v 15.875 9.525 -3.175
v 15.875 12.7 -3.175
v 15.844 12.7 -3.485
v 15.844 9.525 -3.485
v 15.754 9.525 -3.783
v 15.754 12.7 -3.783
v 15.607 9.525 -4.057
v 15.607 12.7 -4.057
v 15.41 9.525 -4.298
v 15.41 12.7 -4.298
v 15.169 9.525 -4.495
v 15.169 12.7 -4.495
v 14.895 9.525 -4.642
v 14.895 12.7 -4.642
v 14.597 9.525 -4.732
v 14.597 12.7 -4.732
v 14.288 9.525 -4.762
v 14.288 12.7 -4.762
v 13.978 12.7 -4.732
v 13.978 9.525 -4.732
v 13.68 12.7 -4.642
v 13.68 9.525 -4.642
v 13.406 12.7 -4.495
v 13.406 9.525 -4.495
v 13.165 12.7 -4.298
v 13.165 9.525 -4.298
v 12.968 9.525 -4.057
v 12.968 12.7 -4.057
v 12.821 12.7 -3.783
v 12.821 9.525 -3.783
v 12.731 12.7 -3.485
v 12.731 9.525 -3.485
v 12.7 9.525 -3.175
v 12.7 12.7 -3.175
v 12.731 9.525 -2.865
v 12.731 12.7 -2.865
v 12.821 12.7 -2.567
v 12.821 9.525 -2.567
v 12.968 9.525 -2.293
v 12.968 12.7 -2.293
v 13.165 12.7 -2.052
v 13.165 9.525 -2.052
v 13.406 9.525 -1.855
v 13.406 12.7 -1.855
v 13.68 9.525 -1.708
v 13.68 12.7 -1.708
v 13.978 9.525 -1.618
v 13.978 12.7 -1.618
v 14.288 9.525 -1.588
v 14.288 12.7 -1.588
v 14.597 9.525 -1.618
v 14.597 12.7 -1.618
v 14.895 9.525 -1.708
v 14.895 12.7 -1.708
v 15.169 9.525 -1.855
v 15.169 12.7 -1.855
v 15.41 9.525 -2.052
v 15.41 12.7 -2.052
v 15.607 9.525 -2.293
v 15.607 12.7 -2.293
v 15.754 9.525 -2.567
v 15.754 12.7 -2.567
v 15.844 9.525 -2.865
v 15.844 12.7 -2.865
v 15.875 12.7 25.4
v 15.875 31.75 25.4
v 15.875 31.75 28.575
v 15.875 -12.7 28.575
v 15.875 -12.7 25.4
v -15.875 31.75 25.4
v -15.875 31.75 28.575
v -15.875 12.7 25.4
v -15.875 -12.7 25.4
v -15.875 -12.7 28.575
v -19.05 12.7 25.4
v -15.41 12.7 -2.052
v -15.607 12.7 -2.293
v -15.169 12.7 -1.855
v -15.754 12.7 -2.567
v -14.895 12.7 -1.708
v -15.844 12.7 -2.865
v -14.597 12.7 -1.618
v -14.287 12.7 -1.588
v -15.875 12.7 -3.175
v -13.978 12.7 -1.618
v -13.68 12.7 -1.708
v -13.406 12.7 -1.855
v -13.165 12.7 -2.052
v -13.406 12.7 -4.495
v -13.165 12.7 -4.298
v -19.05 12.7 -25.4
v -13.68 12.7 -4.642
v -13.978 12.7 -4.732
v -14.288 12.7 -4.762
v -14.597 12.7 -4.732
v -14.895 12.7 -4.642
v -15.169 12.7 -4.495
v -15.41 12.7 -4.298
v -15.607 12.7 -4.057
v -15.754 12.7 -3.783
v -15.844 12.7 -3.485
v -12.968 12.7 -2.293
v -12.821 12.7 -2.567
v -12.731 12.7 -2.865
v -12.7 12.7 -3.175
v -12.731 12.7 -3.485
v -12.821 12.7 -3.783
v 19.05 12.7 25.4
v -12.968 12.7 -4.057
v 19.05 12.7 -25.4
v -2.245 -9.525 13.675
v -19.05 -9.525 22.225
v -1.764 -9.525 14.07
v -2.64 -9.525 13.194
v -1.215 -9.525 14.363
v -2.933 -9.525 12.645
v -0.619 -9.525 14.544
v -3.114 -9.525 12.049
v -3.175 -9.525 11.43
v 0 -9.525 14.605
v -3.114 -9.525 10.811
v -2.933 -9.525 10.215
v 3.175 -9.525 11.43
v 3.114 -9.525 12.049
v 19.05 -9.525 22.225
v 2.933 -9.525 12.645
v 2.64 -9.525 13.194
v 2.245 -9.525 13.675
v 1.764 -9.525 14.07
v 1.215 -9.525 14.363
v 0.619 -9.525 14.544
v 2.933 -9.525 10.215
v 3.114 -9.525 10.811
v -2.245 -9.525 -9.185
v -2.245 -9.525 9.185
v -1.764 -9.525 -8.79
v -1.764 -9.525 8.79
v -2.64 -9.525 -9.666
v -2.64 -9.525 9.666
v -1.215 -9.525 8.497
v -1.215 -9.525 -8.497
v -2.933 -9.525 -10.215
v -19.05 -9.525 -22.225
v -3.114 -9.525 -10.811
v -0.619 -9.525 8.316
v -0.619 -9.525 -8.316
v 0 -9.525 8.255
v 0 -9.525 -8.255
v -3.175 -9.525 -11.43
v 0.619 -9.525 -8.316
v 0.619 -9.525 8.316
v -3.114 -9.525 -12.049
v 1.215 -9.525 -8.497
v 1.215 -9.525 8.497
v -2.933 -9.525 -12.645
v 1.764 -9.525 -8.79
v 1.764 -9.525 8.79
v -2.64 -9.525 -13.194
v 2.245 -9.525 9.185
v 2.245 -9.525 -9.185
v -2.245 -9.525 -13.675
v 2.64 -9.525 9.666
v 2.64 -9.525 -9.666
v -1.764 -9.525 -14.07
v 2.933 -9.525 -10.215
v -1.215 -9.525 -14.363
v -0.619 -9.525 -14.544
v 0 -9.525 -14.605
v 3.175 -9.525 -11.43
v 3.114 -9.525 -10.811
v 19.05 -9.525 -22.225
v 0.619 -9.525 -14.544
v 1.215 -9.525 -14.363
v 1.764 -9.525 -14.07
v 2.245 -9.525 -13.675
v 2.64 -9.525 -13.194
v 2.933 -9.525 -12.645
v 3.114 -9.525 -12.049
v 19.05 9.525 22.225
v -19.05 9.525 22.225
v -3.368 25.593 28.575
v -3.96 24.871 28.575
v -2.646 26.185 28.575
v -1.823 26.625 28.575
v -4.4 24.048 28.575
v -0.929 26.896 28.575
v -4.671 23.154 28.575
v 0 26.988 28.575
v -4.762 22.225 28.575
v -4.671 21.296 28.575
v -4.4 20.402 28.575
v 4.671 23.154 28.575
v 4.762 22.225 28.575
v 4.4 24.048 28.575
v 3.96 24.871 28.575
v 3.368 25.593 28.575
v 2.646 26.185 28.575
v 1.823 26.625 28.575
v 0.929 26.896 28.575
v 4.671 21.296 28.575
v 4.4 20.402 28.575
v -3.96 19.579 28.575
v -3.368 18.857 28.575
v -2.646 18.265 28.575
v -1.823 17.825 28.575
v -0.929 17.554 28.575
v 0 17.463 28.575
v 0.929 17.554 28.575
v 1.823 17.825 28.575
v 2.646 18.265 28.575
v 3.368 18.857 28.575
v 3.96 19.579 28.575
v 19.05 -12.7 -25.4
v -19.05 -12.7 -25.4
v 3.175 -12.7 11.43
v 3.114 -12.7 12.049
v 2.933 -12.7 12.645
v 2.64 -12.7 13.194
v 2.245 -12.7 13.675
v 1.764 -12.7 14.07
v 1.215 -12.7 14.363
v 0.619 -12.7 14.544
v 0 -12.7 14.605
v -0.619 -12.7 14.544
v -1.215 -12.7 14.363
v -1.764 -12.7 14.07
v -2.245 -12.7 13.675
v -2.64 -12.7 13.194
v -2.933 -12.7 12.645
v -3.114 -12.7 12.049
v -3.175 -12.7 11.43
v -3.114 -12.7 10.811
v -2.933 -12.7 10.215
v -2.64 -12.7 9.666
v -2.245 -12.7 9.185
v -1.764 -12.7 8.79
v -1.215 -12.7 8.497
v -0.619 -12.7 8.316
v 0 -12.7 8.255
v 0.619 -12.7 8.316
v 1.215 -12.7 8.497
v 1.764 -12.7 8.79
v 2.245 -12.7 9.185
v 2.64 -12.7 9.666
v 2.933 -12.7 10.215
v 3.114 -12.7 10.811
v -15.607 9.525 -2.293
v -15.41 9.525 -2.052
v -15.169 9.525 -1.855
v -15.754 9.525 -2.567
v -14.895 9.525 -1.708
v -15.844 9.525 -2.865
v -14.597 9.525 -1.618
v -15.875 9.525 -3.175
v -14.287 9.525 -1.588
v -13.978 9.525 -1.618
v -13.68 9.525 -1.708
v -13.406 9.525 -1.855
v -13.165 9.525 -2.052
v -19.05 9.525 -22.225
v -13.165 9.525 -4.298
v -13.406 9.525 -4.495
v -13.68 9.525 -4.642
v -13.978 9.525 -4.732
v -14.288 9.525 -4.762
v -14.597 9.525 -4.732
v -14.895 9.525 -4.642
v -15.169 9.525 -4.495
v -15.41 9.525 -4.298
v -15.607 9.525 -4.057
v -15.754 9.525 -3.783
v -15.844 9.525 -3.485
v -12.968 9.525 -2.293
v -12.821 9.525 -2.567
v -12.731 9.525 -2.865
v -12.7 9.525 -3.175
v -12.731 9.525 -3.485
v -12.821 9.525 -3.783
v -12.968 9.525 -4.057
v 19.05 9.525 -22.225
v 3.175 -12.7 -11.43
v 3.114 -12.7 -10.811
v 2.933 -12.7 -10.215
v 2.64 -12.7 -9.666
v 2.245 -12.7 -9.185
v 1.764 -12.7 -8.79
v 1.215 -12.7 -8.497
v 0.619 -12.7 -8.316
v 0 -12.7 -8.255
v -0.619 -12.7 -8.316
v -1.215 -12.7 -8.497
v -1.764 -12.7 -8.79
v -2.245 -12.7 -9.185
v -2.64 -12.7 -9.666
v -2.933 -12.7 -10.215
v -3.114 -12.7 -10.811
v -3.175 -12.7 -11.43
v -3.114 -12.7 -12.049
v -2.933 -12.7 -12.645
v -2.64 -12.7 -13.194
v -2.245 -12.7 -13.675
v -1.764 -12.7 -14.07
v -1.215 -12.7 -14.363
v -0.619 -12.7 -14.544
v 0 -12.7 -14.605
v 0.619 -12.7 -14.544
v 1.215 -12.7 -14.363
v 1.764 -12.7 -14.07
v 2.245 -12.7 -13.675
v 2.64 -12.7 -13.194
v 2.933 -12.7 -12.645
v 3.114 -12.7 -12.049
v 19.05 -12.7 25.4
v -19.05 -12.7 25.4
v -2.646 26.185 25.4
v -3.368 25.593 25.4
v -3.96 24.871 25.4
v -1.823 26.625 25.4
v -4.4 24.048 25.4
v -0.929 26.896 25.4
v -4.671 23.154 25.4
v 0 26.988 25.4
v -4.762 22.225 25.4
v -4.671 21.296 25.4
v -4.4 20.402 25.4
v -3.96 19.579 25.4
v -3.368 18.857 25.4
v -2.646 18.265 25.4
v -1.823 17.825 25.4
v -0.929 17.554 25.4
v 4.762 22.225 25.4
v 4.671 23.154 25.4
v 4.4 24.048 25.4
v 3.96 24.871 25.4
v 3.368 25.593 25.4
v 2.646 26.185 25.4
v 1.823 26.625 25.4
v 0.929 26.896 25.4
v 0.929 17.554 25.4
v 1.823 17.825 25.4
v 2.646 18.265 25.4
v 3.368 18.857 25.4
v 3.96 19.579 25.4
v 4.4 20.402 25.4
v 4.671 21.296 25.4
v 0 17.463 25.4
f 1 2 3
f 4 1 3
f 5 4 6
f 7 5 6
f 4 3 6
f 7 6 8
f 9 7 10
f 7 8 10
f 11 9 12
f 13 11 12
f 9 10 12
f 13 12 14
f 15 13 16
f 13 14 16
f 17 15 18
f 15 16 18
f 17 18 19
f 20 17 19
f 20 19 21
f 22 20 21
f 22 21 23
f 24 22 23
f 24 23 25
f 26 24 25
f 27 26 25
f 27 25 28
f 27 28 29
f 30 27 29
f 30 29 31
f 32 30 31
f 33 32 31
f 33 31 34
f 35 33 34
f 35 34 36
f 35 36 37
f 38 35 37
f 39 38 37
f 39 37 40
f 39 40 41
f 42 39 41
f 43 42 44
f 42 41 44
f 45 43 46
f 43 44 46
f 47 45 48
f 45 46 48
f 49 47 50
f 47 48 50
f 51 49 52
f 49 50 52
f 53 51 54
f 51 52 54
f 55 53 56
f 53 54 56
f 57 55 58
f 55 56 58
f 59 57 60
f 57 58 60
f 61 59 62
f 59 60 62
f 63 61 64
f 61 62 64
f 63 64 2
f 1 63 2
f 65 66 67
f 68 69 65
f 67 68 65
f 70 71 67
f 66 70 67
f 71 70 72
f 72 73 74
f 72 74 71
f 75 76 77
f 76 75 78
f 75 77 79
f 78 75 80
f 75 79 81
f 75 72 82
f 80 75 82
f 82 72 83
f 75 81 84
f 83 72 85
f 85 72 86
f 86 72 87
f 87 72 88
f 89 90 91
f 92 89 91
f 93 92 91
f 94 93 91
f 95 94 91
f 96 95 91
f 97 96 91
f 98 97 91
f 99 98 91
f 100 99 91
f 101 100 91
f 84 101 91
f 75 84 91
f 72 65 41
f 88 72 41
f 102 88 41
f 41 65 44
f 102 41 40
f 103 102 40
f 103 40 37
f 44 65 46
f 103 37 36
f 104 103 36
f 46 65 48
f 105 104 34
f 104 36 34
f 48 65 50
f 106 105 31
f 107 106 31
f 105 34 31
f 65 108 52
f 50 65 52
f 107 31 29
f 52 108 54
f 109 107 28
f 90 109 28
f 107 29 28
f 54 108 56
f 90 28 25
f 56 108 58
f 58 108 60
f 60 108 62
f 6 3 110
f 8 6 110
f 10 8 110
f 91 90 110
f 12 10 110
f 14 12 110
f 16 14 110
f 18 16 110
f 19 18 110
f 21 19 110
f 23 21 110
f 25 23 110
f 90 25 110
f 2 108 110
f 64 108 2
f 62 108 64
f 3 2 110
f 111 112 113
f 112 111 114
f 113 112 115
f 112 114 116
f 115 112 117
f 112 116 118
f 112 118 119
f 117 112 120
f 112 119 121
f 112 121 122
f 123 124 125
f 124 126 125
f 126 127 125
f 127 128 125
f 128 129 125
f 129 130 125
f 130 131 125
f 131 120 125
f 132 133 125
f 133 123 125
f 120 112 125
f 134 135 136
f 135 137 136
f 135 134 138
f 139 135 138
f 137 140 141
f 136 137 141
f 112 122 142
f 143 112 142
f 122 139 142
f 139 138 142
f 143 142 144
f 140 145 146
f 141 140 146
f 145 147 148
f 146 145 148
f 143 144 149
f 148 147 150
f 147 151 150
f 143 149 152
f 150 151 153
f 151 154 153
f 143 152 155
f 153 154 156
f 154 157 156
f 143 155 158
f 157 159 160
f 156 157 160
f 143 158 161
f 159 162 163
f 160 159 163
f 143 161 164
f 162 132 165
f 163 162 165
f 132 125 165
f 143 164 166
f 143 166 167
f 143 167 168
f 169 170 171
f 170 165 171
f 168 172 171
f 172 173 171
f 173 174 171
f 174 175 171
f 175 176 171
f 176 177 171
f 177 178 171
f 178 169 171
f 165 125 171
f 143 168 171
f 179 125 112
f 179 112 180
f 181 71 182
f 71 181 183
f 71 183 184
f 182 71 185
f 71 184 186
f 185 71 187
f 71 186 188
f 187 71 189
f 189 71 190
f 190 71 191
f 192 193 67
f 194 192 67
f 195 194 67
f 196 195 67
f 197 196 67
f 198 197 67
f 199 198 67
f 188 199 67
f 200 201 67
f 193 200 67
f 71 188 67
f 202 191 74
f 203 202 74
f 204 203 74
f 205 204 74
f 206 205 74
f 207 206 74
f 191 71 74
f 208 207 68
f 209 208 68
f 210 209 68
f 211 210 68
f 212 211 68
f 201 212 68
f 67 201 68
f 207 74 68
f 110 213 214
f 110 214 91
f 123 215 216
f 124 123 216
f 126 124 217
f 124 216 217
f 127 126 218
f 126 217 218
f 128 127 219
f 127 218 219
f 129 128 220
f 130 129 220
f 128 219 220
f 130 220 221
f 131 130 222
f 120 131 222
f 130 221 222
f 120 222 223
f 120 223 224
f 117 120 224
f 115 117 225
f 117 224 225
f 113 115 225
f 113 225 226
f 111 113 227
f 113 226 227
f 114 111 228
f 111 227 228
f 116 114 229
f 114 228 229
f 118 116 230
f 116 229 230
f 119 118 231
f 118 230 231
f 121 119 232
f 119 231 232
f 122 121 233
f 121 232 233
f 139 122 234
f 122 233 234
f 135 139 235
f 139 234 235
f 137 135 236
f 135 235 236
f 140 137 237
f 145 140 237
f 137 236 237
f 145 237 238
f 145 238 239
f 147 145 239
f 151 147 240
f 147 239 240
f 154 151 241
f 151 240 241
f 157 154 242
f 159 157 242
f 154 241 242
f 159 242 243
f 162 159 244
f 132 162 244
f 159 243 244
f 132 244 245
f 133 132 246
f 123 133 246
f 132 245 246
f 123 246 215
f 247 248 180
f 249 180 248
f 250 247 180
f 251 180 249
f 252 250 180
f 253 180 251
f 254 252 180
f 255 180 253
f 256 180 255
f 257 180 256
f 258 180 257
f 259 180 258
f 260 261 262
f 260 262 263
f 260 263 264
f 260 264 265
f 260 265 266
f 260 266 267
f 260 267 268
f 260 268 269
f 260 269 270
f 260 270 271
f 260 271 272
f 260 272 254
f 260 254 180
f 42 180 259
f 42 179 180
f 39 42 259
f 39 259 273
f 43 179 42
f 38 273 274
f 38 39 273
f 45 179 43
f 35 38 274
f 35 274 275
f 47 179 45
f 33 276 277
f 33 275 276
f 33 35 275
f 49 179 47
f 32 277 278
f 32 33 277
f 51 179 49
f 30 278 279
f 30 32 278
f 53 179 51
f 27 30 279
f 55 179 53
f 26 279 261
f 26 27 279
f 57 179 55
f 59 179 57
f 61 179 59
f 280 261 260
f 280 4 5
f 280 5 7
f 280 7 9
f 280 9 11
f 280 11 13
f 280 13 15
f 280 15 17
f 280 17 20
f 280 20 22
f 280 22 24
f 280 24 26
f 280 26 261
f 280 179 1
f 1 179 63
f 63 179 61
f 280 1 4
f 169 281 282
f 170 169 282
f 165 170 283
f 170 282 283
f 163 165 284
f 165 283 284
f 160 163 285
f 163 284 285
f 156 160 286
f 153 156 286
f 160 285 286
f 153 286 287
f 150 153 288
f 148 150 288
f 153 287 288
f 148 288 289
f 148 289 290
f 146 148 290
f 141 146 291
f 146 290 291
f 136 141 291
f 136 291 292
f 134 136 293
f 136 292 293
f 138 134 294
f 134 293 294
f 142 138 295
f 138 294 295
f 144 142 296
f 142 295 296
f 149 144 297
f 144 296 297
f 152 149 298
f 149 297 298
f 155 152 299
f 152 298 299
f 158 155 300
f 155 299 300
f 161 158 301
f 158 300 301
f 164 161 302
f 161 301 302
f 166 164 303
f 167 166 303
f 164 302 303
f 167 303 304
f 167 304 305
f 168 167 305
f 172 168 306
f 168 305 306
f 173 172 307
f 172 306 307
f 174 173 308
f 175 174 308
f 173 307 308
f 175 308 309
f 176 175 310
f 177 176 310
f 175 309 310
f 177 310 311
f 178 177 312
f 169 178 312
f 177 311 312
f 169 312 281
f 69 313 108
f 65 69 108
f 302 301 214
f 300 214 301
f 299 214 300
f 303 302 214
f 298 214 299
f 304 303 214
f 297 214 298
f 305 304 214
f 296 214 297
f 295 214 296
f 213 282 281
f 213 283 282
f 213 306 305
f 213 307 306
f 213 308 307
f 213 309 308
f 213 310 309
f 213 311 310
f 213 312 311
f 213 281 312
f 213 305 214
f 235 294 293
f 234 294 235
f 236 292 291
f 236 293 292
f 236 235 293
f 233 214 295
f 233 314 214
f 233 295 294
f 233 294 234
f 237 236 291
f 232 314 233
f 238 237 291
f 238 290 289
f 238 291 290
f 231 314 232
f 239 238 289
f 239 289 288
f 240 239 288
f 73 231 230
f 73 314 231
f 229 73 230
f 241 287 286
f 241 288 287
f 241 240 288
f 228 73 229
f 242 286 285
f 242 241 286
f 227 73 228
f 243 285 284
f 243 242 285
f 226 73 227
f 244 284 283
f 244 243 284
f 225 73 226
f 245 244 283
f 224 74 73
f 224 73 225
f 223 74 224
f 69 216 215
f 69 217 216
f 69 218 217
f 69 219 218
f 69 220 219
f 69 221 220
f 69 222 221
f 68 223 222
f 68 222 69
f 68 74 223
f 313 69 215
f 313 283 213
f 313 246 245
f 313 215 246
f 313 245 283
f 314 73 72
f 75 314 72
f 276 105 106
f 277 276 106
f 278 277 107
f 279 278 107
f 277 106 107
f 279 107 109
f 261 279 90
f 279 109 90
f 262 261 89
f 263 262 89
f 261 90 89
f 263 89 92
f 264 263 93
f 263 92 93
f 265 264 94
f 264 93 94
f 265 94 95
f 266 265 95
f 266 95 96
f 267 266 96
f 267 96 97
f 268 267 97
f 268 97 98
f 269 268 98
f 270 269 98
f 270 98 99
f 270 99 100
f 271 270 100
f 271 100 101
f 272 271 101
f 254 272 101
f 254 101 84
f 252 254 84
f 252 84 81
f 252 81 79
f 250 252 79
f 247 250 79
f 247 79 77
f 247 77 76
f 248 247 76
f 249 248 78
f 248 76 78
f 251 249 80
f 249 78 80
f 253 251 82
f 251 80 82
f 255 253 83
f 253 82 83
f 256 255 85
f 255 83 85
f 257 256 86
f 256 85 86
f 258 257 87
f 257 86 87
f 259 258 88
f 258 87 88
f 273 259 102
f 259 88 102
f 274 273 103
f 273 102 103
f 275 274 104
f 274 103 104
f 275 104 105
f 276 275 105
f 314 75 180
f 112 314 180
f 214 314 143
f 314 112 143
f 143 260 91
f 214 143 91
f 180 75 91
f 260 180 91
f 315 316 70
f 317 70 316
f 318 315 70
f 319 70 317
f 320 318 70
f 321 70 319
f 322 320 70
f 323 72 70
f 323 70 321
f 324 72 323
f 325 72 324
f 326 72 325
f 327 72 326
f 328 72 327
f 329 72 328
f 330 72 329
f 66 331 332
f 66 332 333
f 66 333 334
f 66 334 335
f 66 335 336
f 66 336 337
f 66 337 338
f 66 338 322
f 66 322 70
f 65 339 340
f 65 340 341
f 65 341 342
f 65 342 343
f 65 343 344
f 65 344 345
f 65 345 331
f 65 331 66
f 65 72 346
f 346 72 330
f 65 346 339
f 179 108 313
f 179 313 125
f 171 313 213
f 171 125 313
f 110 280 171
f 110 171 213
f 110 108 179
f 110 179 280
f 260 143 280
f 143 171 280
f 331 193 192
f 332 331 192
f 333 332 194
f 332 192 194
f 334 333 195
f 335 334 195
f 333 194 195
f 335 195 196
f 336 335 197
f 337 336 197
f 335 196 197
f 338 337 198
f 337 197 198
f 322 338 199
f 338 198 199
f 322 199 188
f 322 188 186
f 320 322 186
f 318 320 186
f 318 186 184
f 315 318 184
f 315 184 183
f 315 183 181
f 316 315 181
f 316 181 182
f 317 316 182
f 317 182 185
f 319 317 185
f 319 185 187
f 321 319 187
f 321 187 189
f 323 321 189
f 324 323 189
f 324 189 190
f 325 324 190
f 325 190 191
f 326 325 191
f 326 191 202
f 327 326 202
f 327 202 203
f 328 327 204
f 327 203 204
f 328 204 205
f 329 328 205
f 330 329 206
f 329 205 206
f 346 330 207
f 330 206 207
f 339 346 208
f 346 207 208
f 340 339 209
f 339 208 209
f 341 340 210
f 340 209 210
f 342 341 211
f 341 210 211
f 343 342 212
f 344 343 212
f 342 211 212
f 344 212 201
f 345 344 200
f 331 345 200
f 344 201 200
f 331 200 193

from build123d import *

# Parameters (mm, degrees)
SKETCH1_W           = 50.8
SKETCH1_H           = 25.4
SKETCH1_W_2         = 44.45
SKETCH1_H_2         = 19.05
EXTRUDE_THIN1_DEPTH = 19.05
SKETCH2_W           = 31.75
SKETCH2_H           = 3.175
BOSS_EXTRUDE1_DEPTH = 44.45
CUT_EXTRUDE1_REACH  = 55.975
SKETCH3_R           = 4.7625
CUT_EXTRUDE2_REACH  = 27.4
SKETCH4_R           = 1.5875
SKETCH8_R           = 3.175
CUT_EXTRUDE4_DEPTH  = 3.175


with BuildPart() as part:
    # Sketch1 → Extrude-Thin1 (new body, symmetric)
    with BuildSketch(Plane(origin=(0, 0, 0), x_dir=(0, 0, -1), z_dir=(1, 0, 0))):
        Rectangle(SKETCH1_W, SKETCH1_H)
        Rectangle(SKETCH1_W_2, SKETCH1_H_2, mode=Mode.SUBTRACT)
    extrude(amount=EXTRUDE_THIN1_DEPTH, both=True)

    # Sketch2 → Boss-Extrude1 (add)
    with BuildSketch(Plane.XZ.offset(12.7)):
        with Locations((0, 26.9875)):
            Rectangle(SKETCH2_W, SKETCH2_H)
    extrude(amount=-BOSS_EXTRUDE1_DEPTH)

    # Sketch3 → Cut-Extrude1 (cut, up to next)
    with BuildSketch(Plane.XY.offset(28.575), mode=Mode.PRIVATE) as cut_extrude1_sk1:
        with Locations((0, 22.225)):
            Circle(SKETCH3_R)
    cut_extrude1_tool1 = extrude(cut_extrude1_sk1.sketch, amount=-CUT_EXTRUDE1_REACH, mode=Mode.PRIVATE) & part.part
    add(cut_extrude1_tool1.solids().sort_by_distance((0, 22.225, 28.575))[0], mode=Mode.SUBTRACT)

    # Sketch4 → Cut-Extrude2 (cut, up to next)
    with BuildSketch(Plane(origin=(0, 12.7, 0), x_dir=(1, 0, 0), z_dir=(0, 1, 0)), mode=Mode.PRIVATE) as cut_extrude2_sk1:
        with Locations((14.2875, 3.175)):
            Circle(SKETCH4_R)
    cut_extrude2_tool1 = extrude(cut_extrude2_sk1.sketch, amount=-CUT_EXTRUDE2_REACH, mode=Mode.PRIVATE) & part.part
    add(cut_extrude2_tool1.solids().sort_by_distance((14.2875, 12.7, -3.175))[0], mode=Mode.SUBTRACT)
    # Sketch4 → Cut-Extrude2 (cut, up to next)
    with BuildSketch(Plane(origin=(0, 12.7, 0), x_dir=(1, 0, 0), z_dir=(0, 1, 0)), mode=Mode.PRIVATE) as cut_extrude2_sk2:
        with Locations((-14.2875, 3.175)):
            Circle(SKETCH4_R)
    cut_extrude2_tool2 = extrude(cut_extrude2_sk2.sketch, amount=-CUT_EXTRUDE2_REACH, mode=Mode.PRIVATE) & part.part
    add(cut_extrude2_tool2.solids().sort_by_distance((-14.2875, 12.7, -3.175))[0], mode=Mode.SUBTRACT)

    # Sketch8 → Cut-Extrude4 (cut)
    with BuildSketch(Plane.XZ.offset(12.7)):
        with Locations((0, -11.43)):
            Circle(SKETCH8_R)
        with Locations((0, 11.43)):
            Circle(SKETCH8_R)
    extrude(amount=-CUT_EXTRUDE4_DEPTH, mode=Mode.SUBTRACT)


solid = part.part
